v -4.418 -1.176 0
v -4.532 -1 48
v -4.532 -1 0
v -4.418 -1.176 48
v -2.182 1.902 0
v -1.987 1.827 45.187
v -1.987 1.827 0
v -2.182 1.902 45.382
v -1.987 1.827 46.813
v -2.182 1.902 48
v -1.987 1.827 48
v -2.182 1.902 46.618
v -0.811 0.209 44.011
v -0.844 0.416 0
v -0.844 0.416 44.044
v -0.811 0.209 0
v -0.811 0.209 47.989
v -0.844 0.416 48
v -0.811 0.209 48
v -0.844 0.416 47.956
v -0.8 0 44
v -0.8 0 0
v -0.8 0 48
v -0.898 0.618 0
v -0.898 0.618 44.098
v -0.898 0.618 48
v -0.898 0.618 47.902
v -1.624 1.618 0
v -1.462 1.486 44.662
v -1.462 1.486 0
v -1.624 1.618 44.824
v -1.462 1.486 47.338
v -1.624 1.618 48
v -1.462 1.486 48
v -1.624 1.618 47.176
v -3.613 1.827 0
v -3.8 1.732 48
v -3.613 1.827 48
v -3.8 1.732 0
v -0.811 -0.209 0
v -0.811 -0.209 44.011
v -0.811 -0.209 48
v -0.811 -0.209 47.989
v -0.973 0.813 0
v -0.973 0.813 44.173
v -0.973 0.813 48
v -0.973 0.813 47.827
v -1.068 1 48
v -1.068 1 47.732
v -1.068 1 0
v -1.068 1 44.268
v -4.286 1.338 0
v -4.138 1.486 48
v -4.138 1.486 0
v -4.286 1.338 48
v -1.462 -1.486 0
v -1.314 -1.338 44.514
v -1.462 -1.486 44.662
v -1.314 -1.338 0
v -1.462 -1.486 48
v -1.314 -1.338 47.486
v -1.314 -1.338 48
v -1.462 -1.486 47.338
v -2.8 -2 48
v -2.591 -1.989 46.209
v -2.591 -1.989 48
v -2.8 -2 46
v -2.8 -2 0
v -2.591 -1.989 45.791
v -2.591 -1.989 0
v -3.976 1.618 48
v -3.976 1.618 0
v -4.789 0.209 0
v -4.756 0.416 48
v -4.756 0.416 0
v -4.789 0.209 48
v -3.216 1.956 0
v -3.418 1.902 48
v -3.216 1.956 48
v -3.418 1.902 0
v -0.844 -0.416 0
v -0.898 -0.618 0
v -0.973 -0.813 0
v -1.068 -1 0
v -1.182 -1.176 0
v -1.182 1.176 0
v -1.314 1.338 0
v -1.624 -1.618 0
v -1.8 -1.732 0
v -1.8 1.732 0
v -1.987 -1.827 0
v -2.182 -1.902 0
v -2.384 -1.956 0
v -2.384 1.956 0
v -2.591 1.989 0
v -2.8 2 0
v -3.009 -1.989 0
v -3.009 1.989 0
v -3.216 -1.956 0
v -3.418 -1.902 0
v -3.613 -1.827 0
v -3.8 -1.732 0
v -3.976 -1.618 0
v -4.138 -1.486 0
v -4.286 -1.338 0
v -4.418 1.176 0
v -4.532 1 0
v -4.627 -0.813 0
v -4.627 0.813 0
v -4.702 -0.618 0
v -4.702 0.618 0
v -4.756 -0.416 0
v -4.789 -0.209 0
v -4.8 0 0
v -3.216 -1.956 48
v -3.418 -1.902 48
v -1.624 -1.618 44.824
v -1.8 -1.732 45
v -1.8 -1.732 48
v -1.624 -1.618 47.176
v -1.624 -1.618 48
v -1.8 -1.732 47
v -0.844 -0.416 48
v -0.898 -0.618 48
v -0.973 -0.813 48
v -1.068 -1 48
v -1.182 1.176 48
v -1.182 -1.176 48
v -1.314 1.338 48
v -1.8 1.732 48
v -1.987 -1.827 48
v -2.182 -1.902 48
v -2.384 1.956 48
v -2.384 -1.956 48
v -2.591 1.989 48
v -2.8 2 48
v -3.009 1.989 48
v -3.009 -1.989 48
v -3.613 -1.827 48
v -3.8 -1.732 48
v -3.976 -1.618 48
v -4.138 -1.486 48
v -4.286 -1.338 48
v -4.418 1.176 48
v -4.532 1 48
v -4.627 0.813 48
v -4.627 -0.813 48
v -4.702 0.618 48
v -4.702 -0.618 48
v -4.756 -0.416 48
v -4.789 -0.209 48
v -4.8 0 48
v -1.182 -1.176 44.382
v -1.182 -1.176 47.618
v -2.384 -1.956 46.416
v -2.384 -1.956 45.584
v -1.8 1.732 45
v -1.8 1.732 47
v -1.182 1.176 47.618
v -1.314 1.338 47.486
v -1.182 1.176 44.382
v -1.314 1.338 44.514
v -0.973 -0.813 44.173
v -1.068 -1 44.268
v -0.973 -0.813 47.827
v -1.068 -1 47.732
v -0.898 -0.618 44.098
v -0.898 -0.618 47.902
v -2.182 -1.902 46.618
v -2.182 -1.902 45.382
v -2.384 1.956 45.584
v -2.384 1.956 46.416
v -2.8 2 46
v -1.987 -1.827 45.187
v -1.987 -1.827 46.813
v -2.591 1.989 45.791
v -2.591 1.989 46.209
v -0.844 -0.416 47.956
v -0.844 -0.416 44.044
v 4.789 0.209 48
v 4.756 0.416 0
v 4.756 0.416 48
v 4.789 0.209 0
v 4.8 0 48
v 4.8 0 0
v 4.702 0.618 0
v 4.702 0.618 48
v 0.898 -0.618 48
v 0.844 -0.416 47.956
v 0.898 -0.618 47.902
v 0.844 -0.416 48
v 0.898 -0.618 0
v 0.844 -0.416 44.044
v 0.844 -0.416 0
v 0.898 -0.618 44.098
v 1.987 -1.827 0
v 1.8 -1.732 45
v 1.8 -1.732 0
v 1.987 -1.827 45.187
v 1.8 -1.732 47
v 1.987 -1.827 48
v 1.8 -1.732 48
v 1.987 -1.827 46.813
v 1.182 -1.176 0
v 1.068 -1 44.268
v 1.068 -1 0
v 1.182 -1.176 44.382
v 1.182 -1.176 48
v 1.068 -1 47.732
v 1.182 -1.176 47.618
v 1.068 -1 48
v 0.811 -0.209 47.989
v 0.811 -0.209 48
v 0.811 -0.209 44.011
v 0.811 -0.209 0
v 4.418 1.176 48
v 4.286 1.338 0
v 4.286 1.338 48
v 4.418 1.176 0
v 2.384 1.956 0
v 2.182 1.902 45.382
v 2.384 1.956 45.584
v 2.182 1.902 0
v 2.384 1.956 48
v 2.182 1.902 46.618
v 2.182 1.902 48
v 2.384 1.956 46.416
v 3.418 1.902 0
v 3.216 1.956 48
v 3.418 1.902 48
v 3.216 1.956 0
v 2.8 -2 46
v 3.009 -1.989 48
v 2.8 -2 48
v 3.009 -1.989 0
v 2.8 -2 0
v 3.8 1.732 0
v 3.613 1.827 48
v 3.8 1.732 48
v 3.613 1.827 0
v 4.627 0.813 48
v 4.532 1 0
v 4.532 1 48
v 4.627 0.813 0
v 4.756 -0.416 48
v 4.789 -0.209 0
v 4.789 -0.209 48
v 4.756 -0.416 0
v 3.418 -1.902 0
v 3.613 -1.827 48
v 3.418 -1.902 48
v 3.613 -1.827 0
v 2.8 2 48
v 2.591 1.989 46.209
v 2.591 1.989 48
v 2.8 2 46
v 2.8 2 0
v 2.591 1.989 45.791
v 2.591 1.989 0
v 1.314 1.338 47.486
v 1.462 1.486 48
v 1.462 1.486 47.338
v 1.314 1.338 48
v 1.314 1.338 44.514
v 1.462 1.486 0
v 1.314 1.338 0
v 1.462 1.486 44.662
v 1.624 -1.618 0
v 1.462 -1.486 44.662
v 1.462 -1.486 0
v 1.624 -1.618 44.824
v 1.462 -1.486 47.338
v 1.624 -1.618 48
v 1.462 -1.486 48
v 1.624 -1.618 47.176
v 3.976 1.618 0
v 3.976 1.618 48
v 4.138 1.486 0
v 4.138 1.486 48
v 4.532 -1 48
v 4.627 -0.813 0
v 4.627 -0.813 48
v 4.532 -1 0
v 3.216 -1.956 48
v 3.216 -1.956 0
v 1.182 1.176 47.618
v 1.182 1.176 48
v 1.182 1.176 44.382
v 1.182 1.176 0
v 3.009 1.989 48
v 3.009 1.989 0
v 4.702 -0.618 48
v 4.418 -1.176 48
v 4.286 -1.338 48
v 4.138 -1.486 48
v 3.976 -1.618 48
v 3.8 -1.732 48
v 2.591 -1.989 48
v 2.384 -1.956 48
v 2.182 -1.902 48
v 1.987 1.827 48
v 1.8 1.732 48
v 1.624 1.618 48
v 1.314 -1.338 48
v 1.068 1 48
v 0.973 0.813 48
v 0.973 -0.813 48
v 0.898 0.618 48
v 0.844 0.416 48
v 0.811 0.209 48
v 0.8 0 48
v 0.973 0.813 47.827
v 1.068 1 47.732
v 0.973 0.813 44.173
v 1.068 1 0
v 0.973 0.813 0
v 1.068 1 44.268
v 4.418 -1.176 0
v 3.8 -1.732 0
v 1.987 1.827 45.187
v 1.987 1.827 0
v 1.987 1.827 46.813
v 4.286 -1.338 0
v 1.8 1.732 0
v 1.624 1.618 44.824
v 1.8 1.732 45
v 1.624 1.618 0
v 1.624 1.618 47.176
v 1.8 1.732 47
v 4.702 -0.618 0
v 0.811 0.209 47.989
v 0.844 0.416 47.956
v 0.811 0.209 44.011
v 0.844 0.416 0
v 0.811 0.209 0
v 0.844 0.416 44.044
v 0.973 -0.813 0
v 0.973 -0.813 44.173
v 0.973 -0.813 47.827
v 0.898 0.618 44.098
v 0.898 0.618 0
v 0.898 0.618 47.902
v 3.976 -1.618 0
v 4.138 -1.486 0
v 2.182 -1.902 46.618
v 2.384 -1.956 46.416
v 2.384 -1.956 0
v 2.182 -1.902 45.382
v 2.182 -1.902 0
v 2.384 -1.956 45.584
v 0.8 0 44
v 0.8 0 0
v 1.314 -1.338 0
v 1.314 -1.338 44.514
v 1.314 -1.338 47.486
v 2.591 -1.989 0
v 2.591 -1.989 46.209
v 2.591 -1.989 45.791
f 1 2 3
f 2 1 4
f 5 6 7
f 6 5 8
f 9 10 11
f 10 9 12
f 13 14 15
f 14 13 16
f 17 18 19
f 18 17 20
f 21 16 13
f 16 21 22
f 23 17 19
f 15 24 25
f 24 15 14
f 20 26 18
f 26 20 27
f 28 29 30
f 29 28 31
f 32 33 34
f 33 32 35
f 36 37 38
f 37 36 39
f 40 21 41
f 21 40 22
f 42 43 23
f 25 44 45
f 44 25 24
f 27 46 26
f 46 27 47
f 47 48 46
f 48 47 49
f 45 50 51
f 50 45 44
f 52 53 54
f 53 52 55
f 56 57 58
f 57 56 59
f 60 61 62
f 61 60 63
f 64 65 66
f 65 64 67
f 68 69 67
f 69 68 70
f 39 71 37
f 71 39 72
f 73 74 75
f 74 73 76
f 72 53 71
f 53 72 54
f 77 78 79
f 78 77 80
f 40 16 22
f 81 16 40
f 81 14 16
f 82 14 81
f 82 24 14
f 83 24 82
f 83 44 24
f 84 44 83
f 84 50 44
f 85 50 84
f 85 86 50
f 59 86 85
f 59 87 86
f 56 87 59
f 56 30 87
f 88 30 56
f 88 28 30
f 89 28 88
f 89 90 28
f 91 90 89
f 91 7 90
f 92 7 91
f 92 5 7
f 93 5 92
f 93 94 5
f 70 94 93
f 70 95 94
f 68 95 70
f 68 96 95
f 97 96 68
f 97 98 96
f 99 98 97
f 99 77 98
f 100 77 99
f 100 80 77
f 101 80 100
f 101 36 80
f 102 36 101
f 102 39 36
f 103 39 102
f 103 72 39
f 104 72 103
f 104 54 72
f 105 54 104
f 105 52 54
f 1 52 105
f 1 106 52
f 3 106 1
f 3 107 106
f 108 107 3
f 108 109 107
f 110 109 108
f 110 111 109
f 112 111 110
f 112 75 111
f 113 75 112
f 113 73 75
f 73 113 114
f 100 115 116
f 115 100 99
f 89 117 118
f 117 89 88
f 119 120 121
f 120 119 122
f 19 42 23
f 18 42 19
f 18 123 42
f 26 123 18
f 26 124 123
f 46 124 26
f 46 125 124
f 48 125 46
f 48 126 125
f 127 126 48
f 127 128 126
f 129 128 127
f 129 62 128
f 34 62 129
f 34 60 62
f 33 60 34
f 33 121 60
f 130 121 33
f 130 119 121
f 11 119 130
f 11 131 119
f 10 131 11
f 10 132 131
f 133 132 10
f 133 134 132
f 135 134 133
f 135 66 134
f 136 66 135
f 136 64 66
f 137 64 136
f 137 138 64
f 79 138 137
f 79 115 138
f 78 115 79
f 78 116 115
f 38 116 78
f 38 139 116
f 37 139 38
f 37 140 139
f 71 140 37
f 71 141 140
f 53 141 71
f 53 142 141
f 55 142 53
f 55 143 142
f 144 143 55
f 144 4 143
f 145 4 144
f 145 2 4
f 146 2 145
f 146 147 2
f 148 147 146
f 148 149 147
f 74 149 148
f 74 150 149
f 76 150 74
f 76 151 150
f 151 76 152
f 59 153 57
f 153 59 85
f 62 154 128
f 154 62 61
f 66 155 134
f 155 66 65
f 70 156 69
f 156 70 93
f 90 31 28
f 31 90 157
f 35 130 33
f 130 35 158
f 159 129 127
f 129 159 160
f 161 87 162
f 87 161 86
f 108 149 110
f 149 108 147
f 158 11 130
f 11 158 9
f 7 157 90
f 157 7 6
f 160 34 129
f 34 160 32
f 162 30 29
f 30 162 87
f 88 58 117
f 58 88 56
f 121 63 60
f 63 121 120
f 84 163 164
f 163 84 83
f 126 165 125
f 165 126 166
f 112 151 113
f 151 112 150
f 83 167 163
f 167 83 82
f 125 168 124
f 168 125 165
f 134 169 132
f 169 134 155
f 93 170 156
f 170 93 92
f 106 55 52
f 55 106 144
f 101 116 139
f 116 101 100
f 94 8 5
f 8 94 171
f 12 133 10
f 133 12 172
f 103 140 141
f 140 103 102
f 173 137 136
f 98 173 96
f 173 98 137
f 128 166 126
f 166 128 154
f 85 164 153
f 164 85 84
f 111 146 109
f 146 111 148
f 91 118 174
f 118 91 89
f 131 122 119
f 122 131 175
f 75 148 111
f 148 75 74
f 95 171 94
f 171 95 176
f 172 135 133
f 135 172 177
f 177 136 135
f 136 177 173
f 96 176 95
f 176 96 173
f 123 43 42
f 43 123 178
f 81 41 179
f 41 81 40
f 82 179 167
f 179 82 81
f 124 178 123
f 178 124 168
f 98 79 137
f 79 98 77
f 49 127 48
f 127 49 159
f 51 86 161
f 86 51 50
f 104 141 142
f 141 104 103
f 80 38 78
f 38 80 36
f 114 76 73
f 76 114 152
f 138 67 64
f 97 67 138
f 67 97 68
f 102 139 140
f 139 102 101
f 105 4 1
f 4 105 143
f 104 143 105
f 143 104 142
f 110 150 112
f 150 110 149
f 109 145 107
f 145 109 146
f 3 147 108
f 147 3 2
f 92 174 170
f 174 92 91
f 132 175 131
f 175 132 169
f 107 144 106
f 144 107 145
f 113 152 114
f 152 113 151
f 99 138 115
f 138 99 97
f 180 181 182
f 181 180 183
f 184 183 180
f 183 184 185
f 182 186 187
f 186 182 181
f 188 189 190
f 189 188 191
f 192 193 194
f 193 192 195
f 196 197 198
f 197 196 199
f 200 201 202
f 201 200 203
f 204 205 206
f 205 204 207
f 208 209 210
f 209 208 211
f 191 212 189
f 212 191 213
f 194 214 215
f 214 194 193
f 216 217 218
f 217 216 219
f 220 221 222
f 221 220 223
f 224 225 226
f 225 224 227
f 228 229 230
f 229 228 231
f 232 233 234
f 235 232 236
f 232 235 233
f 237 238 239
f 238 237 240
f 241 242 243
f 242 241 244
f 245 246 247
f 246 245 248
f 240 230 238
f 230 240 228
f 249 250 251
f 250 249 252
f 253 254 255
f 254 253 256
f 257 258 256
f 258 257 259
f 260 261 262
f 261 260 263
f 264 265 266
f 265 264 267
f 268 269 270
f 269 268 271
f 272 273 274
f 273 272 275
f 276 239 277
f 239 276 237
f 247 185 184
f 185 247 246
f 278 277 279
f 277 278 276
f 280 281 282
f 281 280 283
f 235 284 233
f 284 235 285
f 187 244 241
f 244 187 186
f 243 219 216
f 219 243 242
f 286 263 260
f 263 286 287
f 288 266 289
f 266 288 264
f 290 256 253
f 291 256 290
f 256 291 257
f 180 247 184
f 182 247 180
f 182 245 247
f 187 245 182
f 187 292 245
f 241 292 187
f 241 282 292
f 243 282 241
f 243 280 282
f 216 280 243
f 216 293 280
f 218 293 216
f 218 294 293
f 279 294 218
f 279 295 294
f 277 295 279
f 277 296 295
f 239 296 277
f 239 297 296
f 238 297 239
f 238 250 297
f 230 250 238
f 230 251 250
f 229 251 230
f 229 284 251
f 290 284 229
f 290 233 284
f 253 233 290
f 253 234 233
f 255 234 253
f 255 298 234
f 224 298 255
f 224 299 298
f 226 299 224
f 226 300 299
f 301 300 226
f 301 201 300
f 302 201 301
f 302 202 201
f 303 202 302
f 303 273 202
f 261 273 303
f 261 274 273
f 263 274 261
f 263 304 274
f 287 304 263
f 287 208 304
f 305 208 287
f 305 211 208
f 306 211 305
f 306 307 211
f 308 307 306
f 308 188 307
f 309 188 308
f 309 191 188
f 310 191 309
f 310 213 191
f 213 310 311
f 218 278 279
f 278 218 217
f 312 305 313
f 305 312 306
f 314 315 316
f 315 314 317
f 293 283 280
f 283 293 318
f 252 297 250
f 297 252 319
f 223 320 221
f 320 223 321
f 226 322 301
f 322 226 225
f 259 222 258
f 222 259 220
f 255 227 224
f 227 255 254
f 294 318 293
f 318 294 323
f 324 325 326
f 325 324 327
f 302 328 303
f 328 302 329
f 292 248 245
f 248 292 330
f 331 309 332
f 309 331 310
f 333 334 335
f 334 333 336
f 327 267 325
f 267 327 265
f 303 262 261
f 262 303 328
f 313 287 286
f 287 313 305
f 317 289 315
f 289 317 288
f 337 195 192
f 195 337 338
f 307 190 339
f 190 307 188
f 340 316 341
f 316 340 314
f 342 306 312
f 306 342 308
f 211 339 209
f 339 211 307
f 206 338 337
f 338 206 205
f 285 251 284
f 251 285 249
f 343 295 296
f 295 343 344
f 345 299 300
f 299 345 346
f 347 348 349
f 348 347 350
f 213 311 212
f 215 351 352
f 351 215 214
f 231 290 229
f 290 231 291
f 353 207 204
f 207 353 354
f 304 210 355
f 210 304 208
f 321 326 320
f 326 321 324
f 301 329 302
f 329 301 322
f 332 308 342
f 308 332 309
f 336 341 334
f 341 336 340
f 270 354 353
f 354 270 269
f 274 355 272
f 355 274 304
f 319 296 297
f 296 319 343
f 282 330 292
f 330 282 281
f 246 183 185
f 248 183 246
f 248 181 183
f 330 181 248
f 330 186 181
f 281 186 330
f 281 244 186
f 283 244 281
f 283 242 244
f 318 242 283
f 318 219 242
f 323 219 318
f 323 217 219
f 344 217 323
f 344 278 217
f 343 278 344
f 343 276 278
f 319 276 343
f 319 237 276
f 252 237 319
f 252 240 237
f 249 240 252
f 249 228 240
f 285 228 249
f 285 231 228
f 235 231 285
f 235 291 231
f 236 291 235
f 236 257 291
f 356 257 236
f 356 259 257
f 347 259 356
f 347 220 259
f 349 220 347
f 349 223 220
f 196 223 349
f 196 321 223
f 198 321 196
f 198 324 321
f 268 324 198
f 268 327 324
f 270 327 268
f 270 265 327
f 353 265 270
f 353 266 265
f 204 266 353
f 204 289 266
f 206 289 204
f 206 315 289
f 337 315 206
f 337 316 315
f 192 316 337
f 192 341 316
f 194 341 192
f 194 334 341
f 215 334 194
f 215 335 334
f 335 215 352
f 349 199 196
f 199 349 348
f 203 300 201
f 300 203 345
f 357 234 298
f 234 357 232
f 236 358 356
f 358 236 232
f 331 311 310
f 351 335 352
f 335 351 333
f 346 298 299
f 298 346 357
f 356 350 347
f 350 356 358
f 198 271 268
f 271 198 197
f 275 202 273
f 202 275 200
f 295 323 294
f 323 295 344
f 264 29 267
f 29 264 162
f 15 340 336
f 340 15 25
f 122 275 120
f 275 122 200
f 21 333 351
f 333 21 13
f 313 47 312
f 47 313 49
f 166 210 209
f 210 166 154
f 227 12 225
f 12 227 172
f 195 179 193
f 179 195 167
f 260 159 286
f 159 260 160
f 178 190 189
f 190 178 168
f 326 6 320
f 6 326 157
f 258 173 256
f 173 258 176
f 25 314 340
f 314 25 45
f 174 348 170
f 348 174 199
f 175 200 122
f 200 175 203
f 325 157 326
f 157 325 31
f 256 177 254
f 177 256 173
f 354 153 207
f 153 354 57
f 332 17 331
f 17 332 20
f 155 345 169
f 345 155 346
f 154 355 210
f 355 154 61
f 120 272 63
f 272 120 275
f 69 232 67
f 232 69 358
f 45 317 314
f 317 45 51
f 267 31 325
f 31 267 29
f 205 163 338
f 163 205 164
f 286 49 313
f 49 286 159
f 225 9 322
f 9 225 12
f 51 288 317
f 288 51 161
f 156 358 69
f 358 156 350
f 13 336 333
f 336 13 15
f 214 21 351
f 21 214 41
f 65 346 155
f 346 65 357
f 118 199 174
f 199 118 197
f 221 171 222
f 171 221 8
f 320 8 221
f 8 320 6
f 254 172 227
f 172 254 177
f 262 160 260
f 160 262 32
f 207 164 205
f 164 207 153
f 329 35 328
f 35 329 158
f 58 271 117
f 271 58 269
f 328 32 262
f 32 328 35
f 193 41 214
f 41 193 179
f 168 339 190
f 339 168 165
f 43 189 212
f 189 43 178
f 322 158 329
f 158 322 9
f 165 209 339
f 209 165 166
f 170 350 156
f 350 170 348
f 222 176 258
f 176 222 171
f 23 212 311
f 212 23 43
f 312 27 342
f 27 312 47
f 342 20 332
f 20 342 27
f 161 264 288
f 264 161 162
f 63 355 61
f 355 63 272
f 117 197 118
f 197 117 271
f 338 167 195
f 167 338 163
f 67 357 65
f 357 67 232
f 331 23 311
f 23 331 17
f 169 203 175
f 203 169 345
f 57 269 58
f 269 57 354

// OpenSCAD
// Two-prong cotter pin.
$fn = 60;
eps = 0.02;
wire_d = 4;
length = 48;
prong_gap = wire_d*1.4;
union() {
    translate([-prong_gap/2,0,0]) cylinder(d=wire_d,h=length);
    translate([prong_gap/2,0,0]) cylinder(d=wire_d,h=length);
    translate([-prong_gap/2,0,length-wire_d/2]) rotate([0,90,0]) cylinder(d=wire_d,h=prong_gap);
}
